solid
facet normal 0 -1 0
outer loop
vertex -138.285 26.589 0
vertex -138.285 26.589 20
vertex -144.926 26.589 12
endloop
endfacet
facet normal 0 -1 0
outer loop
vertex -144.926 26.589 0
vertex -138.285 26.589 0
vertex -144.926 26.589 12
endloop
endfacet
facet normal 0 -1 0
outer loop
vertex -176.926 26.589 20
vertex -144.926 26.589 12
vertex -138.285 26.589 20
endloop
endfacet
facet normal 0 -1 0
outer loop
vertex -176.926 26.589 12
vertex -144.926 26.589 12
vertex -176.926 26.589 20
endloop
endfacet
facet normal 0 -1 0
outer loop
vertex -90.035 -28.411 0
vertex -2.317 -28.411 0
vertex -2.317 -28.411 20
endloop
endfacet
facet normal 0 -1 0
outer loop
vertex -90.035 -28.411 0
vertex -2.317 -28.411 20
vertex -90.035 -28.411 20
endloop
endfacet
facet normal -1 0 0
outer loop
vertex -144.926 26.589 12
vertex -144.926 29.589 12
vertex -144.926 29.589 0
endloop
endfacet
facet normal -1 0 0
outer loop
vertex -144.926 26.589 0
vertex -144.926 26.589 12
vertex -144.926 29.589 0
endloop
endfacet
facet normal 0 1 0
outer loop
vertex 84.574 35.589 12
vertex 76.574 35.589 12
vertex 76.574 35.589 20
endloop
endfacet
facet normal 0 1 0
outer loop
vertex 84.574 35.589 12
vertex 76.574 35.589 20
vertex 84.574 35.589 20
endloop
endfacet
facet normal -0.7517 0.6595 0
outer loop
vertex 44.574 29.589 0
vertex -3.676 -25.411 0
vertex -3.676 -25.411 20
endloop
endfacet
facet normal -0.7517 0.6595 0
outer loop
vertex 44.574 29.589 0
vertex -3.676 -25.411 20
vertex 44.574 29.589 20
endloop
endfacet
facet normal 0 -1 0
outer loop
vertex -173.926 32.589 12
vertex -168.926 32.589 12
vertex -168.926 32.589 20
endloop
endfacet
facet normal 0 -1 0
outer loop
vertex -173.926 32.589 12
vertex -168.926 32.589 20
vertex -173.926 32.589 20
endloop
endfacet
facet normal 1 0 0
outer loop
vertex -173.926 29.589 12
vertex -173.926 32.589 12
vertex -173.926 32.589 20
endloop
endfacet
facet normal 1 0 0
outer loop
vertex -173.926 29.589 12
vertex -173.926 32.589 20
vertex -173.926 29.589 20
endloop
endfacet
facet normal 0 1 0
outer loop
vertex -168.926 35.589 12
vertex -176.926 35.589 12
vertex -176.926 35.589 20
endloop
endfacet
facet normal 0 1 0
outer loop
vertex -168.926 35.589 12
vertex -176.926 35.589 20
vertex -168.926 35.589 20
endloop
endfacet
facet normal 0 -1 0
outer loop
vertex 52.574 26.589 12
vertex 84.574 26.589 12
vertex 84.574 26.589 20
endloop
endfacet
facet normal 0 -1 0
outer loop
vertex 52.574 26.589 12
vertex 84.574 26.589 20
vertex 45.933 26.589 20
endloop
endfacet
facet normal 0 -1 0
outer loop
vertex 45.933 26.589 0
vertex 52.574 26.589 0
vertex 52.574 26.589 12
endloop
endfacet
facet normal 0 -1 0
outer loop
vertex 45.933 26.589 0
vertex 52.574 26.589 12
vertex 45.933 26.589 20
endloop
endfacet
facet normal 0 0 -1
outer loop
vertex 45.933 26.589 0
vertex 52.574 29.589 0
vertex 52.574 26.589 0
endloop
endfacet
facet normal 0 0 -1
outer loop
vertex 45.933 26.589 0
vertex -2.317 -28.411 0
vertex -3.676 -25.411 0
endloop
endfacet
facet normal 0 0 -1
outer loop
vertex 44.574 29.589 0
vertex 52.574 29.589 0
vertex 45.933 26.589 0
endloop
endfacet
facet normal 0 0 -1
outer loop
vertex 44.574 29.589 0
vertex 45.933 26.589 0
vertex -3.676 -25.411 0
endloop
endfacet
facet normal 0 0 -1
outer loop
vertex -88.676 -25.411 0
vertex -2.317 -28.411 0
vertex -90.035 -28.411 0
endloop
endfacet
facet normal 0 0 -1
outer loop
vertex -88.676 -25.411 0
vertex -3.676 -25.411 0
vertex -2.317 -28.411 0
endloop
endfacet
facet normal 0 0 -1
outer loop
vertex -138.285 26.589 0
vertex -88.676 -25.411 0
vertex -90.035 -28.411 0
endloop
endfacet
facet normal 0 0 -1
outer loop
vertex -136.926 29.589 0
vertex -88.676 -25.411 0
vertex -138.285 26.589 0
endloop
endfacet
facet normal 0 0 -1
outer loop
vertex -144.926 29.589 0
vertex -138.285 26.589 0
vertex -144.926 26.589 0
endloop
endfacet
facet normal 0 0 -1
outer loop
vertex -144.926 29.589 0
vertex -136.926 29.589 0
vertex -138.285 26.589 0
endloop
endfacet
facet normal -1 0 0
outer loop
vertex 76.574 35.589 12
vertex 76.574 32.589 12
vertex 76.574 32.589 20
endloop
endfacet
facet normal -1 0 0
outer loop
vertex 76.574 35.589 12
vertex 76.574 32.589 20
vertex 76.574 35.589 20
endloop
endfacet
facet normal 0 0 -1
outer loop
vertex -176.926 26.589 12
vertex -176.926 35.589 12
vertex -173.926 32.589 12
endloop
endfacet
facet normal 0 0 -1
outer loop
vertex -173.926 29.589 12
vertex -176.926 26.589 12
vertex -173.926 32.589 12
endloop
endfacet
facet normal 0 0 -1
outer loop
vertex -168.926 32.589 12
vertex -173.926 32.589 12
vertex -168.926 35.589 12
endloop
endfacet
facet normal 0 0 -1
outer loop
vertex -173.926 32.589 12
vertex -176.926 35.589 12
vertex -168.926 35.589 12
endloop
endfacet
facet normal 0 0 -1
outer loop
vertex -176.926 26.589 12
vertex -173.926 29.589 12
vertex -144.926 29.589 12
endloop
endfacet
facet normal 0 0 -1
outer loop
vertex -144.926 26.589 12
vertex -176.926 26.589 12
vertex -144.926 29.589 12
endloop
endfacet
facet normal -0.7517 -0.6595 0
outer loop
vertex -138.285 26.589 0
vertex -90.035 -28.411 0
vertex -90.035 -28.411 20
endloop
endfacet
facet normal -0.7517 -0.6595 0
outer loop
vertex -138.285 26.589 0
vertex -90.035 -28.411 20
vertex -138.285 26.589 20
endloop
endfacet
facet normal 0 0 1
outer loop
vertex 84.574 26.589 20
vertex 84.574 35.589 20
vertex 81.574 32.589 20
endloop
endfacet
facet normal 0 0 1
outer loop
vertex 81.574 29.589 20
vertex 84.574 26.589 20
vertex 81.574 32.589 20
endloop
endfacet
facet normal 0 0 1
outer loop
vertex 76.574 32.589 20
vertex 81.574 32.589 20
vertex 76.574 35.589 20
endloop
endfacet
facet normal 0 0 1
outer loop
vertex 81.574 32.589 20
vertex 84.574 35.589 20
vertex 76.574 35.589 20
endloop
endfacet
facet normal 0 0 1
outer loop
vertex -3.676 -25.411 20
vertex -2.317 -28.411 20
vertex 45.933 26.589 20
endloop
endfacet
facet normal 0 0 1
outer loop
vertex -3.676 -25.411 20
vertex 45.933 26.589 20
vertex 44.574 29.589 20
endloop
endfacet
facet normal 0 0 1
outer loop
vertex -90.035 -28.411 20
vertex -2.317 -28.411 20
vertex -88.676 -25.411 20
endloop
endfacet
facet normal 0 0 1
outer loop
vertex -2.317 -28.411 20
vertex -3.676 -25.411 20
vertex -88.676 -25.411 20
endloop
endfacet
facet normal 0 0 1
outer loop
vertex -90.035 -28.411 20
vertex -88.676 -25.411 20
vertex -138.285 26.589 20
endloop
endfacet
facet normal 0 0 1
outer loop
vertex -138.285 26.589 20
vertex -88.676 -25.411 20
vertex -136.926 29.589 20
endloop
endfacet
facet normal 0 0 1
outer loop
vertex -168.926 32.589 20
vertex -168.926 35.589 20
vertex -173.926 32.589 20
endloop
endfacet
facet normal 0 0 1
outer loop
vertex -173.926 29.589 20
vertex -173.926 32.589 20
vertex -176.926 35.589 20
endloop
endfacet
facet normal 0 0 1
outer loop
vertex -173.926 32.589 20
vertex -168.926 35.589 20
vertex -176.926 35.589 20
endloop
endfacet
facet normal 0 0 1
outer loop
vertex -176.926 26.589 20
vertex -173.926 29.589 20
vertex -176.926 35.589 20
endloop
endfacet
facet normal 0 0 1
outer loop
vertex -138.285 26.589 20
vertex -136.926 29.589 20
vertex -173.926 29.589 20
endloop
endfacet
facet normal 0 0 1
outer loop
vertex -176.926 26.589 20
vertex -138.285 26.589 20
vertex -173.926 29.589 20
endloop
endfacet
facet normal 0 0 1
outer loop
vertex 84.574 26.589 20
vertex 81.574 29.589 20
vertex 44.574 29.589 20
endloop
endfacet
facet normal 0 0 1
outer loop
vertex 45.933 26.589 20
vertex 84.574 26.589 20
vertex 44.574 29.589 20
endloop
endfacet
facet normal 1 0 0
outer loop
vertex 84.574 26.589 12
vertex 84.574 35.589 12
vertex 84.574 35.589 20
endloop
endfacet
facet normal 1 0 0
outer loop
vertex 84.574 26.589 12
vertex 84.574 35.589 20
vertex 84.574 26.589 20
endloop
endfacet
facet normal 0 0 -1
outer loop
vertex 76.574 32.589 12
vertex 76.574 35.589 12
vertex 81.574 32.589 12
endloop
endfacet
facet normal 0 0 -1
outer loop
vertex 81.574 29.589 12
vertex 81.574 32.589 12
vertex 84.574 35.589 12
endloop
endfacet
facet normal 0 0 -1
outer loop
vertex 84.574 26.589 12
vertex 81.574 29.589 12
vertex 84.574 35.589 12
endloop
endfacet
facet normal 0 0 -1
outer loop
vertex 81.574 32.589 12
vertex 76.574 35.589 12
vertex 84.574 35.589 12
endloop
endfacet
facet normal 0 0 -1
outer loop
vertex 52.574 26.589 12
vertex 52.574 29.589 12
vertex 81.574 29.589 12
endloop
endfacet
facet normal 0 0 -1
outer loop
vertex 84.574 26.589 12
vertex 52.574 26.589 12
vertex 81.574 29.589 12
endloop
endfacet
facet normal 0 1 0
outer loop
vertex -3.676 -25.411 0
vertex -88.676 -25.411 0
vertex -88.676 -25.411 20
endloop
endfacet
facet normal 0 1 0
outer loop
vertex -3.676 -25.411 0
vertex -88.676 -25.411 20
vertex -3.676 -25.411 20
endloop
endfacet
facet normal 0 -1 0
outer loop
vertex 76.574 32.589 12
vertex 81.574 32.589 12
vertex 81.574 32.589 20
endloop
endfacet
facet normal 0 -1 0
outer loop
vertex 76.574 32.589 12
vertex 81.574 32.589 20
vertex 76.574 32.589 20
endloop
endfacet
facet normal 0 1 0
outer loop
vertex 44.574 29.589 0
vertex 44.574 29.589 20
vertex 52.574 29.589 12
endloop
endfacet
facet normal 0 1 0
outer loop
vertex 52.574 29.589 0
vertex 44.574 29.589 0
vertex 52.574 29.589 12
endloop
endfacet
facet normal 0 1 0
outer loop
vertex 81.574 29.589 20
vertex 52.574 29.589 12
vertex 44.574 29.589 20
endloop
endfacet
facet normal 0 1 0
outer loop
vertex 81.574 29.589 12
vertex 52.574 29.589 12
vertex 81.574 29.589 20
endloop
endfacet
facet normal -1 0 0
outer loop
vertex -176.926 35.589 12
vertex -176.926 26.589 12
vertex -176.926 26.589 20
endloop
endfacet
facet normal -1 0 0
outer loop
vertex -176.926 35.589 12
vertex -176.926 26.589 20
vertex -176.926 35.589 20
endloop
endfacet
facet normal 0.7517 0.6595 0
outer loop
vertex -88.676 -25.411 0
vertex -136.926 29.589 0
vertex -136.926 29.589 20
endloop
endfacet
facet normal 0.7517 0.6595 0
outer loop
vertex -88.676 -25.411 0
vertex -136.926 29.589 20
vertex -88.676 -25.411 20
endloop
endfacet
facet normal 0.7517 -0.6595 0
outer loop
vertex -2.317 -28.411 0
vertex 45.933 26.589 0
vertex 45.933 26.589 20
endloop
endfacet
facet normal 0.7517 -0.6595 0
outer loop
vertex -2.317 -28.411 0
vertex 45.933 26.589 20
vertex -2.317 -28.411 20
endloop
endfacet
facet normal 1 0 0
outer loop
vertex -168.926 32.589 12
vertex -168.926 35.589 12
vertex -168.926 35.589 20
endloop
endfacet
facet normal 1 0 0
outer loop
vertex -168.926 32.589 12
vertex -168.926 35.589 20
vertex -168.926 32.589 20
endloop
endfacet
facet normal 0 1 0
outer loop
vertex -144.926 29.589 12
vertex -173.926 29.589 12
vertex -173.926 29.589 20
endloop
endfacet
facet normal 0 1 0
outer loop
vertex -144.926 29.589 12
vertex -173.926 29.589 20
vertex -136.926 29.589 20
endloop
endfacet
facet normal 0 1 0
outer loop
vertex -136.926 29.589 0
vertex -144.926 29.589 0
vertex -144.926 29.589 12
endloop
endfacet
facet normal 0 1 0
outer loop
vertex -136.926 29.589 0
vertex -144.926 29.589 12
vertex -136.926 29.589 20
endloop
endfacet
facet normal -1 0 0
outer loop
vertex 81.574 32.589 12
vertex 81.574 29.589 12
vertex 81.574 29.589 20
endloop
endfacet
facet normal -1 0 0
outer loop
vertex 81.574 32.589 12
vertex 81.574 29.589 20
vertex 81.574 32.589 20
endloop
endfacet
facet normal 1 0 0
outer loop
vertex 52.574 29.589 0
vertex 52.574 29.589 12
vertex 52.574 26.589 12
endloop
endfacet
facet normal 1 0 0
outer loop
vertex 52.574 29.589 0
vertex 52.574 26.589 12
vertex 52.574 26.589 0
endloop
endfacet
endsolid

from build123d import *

# Parameters (mm, degrees)
BOSS_EXTRUDE1_DEPTH = 20
SKETCH2_W           = 32
SKETCH2_H           = 24
CUT_EXTRUDE1_DEPTH  = 190.205374127


with BuildPart() as part:
    # Sketch1 → Boss-Extrude1 (new body)
    with BuildSketch(Plane.XY):
        Polygon((-173.925616004, 29.588970737), (-136.925616004, 29.588970737), (-88.675616004, -25.411029263), (-3.675616004, -25.411029263), (44.574383996, 29.588970737), (81.574383996, 29.588970737), (81.574383996, 32.588970737), (76.574383996, 32.588970737), (76.574383996, 35.588970737), (84.574383996, 35.588970737), (84.574383996, 26.588970737), (45.933363597, 26.588970737), (-2.316636403, -28.411029263), (-90.034595605, -28.411029263), (-138.284595605, 26.588970737), (-176.925616004, 26.588970737), (-176.925616004, 35.588970737), (-168.925616004, 35.588970737), (-168.925616004, 32.588970737), (-173.925616004, 32.588970737), align=None)
    extrude(amount=BOSS_EXTRUDE1_DEPTH)

    # Sketch2 → Cut-Extrude1 (cut, through all)
    with BuildSketch(Plane(origin=(0, 35.588970737, 0), x_dir=(1, 0, 0), z_dir=(0, 1, 0))):
        with Locations((-160.925616004, 0)):
            Rectangle(SKETCH2_W, SKETCH2_H)
        with Locations((68.574383996, 0)):
            Rectangle(SKETCH2_W, SKETCH2_H)
    extrude(amount=-CUT_EXTRUDE1_DEPTH, mode=Mode.SUBTRACT)


solid = part.part
